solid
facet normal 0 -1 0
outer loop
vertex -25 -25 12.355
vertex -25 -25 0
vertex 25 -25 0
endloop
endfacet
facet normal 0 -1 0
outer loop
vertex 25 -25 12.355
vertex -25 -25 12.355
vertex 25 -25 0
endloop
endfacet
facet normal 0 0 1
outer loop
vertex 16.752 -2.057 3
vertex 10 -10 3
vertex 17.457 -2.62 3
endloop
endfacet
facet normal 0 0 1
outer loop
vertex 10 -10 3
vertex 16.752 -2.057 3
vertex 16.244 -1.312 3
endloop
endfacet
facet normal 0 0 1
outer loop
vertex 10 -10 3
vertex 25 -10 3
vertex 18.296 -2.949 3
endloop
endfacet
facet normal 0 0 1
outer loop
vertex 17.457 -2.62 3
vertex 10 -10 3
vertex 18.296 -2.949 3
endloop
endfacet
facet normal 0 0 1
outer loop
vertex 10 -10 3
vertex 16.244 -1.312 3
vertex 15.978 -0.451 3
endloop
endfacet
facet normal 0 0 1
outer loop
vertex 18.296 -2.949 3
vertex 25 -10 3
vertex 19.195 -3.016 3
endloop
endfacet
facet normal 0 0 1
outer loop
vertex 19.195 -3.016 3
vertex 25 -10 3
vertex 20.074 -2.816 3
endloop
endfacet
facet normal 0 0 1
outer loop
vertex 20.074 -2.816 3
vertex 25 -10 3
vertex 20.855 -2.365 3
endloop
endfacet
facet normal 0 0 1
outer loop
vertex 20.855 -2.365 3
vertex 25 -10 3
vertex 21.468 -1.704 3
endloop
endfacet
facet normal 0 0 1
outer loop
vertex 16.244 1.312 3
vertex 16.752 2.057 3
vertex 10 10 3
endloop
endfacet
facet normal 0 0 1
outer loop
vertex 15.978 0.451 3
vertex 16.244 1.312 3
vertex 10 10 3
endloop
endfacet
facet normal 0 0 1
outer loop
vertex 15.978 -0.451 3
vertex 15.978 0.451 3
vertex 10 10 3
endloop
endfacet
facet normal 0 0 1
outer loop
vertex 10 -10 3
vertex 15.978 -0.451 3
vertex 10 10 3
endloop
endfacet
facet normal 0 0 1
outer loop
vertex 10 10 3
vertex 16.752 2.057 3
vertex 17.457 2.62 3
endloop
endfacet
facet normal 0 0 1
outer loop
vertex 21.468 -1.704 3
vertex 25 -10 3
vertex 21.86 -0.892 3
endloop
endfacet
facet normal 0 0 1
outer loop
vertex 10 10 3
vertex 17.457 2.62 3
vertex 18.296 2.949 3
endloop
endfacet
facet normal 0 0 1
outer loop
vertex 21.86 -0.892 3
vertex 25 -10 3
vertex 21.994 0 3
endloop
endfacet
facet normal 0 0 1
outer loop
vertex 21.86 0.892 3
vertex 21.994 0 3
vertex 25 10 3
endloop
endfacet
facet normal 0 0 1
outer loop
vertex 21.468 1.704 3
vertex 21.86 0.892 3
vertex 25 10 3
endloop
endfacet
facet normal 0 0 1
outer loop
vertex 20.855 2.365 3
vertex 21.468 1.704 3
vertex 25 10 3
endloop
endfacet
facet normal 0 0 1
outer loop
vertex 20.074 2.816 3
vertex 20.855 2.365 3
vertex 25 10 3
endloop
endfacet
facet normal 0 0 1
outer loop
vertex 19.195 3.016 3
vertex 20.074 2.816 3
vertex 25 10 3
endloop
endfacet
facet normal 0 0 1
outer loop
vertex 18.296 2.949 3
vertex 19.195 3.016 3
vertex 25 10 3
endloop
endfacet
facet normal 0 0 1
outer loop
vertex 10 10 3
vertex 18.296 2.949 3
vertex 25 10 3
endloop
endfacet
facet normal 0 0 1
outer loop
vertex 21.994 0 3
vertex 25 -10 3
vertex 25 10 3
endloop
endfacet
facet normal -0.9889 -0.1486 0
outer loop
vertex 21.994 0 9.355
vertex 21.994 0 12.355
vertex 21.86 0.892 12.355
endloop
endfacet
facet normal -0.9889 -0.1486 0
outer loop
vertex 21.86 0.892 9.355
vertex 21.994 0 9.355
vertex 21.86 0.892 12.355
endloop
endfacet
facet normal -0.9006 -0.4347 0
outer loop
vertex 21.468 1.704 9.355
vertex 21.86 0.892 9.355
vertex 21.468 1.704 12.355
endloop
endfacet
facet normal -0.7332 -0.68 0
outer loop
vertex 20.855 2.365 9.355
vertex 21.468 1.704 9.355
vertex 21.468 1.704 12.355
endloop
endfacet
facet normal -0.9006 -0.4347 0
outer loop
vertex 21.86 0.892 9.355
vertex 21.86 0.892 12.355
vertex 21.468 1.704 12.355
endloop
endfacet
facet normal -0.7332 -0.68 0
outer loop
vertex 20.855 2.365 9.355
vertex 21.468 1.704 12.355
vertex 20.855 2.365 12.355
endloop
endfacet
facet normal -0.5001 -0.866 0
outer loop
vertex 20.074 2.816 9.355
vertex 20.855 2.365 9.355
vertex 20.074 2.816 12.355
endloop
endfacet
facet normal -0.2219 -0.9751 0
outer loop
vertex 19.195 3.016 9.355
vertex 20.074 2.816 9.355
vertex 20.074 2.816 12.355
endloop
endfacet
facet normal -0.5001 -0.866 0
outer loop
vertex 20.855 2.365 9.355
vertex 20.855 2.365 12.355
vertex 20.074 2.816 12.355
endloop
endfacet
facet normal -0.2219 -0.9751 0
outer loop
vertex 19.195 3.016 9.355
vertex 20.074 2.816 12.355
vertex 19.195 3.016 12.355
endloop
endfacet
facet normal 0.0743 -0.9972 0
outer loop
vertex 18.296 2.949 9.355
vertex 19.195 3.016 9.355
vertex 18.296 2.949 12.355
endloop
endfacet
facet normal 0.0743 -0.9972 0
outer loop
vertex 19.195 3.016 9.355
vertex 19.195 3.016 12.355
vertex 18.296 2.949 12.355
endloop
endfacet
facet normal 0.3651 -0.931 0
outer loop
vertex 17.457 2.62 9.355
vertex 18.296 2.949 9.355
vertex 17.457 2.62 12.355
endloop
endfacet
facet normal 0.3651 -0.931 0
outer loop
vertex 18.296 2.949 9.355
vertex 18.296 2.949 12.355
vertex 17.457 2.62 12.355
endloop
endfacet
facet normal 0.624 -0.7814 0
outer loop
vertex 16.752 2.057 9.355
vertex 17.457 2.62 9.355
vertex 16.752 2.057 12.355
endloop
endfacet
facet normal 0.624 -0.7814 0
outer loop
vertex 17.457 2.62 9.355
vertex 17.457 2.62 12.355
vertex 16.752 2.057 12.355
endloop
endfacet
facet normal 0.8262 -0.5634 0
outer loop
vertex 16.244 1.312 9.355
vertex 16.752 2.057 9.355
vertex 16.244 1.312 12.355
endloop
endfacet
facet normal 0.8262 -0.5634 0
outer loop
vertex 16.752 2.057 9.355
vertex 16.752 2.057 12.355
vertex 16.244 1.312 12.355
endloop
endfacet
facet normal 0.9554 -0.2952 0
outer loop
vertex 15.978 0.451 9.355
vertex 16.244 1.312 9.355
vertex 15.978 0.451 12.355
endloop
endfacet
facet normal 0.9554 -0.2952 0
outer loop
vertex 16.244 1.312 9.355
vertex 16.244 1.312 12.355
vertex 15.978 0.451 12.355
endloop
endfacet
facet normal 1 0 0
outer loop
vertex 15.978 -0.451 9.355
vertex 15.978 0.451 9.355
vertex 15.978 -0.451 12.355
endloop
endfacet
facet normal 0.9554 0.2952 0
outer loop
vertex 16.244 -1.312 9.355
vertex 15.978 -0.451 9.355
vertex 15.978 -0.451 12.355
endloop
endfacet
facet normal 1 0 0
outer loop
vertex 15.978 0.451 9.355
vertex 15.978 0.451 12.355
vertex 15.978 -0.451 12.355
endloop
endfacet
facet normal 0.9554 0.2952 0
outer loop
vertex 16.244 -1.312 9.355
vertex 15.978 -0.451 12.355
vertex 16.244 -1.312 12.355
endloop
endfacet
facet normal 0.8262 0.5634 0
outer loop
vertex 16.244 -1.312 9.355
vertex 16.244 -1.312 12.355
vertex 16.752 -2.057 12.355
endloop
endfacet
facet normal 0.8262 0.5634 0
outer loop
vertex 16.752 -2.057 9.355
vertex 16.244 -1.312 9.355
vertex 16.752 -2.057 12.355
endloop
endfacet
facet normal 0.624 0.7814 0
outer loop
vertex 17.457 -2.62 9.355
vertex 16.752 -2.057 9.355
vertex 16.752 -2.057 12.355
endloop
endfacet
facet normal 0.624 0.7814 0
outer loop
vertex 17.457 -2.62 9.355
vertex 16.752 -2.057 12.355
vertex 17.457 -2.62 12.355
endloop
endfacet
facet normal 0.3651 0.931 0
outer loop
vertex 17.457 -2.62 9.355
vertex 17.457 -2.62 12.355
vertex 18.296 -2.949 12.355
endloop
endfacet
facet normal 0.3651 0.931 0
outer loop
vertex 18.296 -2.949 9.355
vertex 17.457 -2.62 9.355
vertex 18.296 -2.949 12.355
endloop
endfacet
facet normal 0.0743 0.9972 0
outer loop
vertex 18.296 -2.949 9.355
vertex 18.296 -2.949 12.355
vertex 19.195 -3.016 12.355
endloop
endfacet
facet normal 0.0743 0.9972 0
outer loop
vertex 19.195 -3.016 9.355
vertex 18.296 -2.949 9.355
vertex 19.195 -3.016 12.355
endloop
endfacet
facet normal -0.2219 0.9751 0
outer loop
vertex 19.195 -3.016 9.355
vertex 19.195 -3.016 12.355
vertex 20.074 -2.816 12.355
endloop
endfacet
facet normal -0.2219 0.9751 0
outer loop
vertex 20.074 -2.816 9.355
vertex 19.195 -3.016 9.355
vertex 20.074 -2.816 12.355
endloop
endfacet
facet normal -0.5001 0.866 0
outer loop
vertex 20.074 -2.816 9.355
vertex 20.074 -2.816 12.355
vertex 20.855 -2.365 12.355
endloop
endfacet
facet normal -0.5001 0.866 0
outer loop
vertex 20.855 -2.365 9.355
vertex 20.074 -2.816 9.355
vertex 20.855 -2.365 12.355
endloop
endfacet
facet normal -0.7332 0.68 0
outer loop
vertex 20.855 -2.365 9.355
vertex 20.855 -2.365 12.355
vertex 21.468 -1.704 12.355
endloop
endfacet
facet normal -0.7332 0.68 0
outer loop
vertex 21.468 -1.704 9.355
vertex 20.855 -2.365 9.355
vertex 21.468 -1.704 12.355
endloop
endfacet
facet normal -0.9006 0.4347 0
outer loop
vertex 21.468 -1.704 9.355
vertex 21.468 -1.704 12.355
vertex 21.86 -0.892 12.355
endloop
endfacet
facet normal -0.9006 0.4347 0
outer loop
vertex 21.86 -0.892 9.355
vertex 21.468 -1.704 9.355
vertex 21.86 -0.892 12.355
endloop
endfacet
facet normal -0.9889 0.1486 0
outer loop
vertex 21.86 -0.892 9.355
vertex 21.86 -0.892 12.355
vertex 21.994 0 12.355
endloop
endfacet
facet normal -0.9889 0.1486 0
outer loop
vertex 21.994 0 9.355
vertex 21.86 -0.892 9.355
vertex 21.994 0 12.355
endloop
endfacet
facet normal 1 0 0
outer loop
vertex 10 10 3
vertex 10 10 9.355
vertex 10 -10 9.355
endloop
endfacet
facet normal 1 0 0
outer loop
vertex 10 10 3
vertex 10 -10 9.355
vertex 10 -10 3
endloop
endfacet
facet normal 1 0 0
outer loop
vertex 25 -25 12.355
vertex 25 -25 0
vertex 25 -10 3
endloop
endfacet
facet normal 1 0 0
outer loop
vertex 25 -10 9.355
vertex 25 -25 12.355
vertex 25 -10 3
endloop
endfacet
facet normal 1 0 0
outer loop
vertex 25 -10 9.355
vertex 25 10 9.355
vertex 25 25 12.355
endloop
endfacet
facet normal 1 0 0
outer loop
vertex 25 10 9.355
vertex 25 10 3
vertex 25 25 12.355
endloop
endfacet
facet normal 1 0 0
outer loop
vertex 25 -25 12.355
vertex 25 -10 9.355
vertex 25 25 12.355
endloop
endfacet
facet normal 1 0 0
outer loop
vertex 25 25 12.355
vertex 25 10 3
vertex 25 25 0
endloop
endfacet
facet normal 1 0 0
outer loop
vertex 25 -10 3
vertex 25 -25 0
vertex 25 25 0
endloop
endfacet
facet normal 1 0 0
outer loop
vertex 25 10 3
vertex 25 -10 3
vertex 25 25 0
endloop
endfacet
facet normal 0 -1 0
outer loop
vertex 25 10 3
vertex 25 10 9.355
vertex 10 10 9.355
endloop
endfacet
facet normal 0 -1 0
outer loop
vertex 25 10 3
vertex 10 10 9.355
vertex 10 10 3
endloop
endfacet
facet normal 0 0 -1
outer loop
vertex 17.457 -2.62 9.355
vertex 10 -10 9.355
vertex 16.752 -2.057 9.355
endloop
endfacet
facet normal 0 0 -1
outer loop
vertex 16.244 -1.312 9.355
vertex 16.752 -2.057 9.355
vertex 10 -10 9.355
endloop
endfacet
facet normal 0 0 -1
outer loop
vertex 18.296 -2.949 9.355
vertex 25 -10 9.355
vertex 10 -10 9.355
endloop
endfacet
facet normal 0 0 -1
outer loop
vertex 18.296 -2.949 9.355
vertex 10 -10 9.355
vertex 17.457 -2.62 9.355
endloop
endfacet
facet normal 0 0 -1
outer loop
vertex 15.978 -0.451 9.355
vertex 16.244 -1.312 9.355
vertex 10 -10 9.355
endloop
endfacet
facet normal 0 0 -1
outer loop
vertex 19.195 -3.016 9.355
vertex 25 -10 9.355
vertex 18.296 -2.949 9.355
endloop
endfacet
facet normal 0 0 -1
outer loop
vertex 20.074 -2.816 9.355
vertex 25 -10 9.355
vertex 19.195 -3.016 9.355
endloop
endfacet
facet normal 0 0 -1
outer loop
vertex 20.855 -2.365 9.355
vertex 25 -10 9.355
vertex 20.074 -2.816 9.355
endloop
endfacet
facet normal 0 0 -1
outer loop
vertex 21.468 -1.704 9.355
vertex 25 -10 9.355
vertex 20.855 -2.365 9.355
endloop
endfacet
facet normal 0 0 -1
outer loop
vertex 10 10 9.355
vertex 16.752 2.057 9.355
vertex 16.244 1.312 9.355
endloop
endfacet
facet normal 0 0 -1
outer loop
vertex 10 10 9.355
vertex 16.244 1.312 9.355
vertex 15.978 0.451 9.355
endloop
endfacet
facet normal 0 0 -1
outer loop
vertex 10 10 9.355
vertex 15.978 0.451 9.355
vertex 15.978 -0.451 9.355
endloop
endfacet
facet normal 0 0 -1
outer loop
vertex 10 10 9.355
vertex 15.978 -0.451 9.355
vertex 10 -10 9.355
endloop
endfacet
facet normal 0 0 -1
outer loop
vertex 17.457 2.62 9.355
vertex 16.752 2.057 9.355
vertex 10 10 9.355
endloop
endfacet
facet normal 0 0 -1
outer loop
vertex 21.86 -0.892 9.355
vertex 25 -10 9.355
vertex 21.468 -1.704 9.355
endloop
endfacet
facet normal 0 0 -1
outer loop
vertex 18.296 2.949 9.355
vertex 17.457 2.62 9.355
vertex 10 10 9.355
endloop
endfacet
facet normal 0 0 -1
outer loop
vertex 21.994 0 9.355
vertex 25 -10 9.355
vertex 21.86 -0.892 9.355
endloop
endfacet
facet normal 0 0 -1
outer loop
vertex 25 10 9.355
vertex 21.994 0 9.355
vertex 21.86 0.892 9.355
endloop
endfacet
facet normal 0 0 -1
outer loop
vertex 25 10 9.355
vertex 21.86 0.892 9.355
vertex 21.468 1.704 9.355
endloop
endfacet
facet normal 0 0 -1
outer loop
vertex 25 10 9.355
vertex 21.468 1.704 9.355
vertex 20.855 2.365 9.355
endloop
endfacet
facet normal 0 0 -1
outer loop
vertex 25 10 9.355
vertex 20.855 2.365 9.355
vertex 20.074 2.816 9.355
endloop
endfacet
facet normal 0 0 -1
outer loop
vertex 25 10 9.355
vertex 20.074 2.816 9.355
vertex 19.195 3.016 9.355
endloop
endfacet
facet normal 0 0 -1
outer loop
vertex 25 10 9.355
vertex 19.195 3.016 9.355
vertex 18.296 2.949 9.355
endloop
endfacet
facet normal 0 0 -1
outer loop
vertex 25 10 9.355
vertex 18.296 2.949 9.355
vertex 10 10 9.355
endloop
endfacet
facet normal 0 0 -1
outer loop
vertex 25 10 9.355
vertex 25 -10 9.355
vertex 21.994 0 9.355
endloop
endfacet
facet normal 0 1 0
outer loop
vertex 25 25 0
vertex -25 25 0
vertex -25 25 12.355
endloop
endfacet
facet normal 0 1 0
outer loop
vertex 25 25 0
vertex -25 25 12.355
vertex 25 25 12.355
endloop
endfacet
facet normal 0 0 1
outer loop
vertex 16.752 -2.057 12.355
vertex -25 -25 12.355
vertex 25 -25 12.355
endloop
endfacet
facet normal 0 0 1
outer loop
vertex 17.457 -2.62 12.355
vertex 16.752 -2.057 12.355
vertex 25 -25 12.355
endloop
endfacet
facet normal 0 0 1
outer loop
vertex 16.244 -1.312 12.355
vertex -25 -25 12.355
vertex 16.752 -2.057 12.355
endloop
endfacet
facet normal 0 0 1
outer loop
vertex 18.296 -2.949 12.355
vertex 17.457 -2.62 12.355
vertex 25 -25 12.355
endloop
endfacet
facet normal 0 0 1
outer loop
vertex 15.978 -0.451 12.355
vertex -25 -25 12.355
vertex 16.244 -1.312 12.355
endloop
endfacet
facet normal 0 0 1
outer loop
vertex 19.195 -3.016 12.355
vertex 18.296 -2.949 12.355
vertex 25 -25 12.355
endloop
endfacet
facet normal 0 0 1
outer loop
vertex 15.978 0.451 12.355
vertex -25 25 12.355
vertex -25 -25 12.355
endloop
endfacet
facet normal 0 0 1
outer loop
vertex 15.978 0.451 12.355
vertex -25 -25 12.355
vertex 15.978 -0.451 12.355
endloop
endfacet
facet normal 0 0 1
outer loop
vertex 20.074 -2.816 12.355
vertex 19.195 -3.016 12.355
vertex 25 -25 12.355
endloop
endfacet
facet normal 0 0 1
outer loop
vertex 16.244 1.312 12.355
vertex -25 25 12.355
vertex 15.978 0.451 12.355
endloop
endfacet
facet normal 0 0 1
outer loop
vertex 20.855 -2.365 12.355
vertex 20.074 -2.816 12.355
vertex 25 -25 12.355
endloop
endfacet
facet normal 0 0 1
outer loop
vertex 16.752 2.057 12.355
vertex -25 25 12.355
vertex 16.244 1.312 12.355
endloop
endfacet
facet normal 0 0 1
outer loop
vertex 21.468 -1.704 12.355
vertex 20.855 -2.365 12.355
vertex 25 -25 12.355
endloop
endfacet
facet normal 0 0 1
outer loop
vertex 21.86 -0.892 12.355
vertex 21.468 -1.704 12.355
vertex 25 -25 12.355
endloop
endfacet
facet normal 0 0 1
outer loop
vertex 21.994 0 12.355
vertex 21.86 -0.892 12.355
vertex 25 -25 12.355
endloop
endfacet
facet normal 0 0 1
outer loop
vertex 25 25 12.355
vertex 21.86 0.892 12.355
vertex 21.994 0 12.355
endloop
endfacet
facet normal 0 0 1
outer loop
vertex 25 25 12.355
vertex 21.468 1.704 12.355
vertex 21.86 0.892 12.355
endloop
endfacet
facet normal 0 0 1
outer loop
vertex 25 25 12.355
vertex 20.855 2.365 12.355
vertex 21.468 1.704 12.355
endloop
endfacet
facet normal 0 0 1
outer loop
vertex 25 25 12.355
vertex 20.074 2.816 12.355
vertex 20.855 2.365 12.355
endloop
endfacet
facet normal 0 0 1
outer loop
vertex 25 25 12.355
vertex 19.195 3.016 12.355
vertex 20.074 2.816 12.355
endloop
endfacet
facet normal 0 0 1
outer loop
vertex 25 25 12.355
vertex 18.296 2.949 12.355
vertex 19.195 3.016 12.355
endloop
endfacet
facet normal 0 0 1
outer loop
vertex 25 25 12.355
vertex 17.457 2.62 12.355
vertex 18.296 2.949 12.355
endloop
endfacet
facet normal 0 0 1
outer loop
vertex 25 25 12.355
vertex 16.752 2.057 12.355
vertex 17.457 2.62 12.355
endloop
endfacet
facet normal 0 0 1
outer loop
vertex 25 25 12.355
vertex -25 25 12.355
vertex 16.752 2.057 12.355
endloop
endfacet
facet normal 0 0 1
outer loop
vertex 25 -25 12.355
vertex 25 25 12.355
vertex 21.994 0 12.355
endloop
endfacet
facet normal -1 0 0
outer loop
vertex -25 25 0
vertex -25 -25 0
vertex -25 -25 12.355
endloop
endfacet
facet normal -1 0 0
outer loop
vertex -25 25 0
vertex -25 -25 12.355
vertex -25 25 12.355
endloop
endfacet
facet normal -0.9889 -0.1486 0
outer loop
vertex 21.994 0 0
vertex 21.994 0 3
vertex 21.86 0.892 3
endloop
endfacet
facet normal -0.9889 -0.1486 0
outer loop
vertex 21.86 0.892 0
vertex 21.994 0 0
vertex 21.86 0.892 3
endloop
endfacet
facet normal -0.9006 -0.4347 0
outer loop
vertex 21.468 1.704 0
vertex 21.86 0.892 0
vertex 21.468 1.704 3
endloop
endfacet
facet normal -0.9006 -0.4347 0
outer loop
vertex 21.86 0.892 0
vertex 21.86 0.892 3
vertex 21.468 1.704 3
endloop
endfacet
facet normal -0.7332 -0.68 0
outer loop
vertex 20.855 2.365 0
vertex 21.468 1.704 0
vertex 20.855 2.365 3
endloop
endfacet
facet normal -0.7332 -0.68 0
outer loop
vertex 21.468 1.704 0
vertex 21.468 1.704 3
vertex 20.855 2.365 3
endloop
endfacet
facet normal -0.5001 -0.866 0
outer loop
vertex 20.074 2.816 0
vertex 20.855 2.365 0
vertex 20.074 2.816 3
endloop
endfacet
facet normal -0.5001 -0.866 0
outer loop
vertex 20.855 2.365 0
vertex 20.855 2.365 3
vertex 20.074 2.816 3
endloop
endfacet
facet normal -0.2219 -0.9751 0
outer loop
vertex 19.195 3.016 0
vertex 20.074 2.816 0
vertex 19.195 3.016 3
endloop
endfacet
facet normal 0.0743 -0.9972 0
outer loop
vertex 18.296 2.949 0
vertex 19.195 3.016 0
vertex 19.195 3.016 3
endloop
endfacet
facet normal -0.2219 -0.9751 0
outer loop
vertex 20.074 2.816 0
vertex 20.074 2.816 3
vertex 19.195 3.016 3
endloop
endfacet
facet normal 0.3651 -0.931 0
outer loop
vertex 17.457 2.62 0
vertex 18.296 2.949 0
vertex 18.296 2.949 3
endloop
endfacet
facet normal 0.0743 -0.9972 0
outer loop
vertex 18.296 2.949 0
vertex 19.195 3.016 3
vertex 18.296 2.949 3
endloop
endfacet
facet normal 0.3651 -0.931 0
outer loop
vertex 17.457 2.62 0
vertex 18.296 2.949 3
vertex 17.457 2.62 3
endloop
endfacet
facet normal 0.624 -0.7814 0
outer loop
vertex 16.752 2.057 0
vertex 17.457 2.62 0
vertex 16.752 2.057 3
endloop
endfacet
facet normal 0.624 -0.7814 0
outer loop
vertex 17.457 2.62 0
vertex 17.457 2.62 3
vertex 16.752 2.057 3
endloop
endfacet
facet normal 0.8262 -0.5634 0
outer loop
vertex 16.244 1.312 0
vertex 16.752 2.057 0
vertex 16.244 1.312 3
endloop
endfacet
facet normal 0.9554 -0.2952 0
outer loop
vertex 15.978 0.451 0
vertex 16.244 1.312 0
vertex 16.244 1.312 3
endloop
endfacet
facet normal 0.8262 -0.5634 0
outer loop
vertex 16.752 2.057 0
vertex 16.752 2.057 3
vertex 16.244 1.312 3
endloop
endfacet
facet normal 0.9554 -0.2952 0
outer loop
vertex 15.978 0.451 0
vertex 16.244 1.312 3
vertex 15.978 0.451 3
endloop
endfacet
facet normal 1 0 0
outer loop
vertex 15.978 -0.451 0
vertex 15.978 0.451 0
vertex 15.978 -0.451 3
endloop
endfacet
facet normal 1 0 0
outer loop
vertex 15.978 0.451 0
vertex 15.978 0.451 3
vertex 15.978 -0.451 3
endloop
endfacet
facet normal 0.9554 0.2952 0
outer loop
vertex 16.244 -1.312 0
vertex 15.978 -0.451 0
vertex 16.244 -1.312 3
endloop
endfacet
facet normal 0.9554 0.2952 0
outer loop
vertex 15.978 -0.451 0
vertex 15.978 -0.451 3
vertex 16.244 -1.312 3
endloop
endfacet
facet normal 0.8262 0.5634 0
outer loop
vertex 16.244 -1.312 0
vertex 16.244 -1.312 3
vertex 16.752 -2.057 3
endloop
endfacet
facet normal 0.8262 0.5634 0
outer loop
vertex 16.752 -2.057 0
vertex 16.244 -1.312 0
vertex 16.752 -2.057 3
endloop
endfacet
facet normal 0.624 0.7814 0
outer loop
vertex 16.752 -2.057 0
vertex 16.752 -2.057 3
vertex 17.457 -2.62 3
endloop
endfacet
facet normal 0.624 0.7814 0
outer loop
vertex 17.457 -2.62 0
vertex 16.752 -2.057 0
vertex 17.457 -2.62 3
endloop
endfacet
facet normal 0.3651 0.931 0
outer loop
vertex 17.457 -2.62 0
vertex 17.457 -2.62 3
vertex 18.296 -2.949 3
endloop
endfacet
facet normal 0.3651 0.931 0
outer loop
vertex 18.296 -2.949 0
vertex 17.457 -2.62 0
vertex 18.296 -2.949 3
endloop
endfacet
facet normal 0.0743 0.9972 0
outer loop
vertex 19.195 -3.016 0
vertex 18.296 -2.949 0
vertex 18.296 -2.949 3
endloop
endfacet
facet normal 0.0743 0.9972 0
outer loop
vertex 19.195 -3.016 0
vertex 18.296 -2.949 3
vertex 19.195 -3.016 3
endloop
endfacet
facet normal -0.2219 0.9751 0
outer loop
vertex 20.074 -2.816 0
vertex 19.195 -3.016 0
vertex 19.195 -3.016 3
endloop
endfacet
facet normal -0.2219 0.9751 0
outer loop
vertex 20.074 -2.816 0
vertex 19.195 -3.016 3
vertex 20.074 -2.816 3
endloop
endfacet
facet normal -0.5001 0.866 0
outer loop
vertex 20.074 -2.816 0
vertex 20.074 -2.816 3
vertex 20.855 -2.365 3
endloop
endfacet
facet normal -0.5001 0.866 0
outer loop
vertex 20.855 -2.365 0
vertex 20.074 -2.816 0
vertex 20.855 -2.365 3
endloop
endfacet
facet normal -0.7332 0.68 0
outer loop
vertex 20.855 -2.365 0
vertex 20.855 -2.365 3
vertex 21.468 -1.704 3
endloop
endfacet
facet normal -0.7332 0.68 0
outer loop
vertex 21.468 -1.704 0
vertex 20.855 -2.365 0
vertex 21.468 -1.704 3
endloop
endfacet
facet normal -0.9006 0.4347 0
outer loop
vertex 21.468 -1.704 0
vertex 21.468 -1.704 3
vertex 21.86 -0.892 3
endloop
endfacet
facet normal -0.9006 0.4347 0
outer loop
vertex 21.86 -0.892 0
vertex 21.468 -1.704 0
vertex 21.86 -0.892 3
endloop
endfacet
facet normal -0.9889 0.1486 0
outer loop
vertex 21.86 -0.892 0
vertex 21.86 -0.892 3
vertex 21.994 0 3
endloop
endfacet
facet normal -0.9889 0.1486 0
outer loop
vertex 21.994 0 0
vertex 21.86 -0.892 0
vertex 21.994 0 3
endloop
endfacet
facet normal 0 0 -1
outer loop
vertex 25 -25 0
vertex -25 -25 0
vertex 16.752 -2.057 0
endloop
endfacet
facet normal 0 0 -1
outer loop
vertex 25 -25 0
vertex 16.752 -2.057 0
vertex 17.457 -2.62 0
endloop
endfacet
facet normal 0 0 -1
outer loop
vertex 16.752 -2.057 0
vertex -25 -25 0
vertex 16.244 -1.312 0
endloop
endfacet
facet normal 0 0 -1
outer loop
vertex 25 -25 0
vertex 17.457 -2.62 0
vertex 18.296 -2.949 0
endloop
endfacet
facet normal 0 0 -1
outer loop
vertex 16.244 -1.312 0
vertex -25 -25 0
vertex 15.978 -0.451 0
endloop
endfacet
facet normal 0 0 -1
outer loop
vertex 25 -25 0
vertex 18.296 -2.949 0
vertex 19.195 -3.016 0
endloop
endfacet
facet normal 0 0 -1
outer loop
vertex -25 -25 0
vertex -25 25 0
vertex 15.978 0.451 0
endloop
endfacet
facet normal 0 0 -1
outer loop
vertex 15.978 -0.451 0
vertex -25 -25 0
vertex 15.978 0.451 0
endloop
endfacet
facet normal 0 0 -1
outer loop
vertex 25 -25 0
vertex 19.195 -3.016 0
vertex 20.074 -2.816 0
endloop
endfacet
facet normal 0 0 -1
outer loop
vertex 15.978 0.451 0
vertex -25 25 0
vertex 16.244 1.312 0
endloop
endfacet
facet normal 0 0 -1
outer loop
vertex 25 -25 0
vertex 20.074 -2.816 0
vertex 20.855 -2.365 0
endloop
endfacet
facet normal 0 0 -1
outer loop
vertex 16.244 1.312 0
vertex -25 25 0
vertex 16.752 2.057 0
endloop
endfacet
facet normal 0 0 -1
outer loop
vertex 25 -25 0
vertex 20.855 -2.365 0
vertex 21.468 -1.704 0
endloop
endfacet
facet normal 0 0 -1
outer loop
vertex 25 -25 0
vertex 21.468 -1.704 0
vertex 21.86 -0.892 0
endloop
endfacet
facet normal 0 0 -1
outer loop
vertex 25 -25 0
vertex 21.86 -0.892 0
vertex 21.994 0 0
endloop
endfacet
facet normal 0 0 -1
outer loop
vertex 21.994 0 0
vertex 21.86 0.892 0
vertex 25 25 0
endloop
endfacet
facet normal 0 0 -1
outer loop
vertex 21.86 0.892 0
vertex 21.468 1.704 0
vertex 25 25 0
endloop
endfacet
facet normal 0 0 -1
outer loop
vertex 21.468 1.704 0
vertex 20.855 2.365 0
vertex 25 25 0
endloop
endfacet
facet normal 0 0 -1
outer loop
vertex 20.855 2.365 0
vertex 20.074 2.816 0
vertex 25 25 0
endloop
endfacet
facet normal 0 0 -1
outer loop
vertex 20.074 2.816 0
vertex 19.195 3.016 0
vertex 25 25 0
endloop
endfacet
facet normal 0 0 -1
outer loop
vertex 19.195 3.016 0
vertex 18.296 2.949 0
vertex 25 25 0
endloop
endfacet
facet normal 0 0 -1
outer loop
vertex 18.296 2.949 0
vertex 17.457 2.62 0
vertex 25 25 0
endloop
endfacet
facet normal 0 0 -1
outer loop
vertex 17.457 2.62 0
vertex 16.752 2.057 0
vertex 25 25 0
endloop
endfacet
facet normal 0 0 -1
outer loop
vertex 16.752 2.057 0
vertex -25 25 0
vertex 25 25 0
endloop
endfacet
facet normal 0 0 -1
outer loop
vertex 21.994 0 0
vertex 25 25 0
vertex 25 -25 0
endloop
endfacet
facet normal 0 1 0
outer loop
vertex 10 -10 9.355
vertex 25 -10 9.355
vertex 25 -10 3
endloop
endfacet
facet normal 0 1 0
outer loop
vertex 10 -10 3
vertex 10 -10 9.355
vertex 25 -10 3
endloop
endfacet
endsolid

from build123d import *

# Parameters (mm, degrees)
SKETCH_1_W          = 50
SKETCH_1_H          = 50
EXTRUDE_1_DEPTH     = 12.355487047
SKETCH_2_R          = 3.024908428
CUT_EXTRUDE_1_DEPTH = 15
SKETCH_3_W          = 6.355487047
SKETCH_3_H          = 20
CUT_EXTRUDE_2_DEPTH = 15


with BuildPart() as part:
    # 草图1 → 凸台-拉伸1 (new body)
    with BuildSketch(Plane.XY):
        Rectangle(SKETCH_1_W, SKETCH_1_H)
    extrude(amount=EXTRUDE_1_DEPTH)

    # 草图2 → 切除-拉伸1 (cut)
    with BuildSketch(Plane.XY.offset(12.355487047)):
        with Locations((18.969094387, 0)):
            Circle(SKETCH_2_R)
    extrude(amount=-CUT_EXTRUDE_1_DEPTH, mode=Mode.SUBTRACT)

    # 草图3 → 切除-拉伸2 (cut)
    with BuildSketch(Plane(origin=(25, 0, 0), x_dir=(0, 0, -1), z_dir=(1, 0, 0))):
        with Locations((-6.177743524, 0)):
            Rectangle(SKETCH_3_W, SKETCH_3_H)
    extrude(amount=-CUT_EXTRUDE_2_DEPTH, mode=Mode.SUBTRACT)


solid = part.part
